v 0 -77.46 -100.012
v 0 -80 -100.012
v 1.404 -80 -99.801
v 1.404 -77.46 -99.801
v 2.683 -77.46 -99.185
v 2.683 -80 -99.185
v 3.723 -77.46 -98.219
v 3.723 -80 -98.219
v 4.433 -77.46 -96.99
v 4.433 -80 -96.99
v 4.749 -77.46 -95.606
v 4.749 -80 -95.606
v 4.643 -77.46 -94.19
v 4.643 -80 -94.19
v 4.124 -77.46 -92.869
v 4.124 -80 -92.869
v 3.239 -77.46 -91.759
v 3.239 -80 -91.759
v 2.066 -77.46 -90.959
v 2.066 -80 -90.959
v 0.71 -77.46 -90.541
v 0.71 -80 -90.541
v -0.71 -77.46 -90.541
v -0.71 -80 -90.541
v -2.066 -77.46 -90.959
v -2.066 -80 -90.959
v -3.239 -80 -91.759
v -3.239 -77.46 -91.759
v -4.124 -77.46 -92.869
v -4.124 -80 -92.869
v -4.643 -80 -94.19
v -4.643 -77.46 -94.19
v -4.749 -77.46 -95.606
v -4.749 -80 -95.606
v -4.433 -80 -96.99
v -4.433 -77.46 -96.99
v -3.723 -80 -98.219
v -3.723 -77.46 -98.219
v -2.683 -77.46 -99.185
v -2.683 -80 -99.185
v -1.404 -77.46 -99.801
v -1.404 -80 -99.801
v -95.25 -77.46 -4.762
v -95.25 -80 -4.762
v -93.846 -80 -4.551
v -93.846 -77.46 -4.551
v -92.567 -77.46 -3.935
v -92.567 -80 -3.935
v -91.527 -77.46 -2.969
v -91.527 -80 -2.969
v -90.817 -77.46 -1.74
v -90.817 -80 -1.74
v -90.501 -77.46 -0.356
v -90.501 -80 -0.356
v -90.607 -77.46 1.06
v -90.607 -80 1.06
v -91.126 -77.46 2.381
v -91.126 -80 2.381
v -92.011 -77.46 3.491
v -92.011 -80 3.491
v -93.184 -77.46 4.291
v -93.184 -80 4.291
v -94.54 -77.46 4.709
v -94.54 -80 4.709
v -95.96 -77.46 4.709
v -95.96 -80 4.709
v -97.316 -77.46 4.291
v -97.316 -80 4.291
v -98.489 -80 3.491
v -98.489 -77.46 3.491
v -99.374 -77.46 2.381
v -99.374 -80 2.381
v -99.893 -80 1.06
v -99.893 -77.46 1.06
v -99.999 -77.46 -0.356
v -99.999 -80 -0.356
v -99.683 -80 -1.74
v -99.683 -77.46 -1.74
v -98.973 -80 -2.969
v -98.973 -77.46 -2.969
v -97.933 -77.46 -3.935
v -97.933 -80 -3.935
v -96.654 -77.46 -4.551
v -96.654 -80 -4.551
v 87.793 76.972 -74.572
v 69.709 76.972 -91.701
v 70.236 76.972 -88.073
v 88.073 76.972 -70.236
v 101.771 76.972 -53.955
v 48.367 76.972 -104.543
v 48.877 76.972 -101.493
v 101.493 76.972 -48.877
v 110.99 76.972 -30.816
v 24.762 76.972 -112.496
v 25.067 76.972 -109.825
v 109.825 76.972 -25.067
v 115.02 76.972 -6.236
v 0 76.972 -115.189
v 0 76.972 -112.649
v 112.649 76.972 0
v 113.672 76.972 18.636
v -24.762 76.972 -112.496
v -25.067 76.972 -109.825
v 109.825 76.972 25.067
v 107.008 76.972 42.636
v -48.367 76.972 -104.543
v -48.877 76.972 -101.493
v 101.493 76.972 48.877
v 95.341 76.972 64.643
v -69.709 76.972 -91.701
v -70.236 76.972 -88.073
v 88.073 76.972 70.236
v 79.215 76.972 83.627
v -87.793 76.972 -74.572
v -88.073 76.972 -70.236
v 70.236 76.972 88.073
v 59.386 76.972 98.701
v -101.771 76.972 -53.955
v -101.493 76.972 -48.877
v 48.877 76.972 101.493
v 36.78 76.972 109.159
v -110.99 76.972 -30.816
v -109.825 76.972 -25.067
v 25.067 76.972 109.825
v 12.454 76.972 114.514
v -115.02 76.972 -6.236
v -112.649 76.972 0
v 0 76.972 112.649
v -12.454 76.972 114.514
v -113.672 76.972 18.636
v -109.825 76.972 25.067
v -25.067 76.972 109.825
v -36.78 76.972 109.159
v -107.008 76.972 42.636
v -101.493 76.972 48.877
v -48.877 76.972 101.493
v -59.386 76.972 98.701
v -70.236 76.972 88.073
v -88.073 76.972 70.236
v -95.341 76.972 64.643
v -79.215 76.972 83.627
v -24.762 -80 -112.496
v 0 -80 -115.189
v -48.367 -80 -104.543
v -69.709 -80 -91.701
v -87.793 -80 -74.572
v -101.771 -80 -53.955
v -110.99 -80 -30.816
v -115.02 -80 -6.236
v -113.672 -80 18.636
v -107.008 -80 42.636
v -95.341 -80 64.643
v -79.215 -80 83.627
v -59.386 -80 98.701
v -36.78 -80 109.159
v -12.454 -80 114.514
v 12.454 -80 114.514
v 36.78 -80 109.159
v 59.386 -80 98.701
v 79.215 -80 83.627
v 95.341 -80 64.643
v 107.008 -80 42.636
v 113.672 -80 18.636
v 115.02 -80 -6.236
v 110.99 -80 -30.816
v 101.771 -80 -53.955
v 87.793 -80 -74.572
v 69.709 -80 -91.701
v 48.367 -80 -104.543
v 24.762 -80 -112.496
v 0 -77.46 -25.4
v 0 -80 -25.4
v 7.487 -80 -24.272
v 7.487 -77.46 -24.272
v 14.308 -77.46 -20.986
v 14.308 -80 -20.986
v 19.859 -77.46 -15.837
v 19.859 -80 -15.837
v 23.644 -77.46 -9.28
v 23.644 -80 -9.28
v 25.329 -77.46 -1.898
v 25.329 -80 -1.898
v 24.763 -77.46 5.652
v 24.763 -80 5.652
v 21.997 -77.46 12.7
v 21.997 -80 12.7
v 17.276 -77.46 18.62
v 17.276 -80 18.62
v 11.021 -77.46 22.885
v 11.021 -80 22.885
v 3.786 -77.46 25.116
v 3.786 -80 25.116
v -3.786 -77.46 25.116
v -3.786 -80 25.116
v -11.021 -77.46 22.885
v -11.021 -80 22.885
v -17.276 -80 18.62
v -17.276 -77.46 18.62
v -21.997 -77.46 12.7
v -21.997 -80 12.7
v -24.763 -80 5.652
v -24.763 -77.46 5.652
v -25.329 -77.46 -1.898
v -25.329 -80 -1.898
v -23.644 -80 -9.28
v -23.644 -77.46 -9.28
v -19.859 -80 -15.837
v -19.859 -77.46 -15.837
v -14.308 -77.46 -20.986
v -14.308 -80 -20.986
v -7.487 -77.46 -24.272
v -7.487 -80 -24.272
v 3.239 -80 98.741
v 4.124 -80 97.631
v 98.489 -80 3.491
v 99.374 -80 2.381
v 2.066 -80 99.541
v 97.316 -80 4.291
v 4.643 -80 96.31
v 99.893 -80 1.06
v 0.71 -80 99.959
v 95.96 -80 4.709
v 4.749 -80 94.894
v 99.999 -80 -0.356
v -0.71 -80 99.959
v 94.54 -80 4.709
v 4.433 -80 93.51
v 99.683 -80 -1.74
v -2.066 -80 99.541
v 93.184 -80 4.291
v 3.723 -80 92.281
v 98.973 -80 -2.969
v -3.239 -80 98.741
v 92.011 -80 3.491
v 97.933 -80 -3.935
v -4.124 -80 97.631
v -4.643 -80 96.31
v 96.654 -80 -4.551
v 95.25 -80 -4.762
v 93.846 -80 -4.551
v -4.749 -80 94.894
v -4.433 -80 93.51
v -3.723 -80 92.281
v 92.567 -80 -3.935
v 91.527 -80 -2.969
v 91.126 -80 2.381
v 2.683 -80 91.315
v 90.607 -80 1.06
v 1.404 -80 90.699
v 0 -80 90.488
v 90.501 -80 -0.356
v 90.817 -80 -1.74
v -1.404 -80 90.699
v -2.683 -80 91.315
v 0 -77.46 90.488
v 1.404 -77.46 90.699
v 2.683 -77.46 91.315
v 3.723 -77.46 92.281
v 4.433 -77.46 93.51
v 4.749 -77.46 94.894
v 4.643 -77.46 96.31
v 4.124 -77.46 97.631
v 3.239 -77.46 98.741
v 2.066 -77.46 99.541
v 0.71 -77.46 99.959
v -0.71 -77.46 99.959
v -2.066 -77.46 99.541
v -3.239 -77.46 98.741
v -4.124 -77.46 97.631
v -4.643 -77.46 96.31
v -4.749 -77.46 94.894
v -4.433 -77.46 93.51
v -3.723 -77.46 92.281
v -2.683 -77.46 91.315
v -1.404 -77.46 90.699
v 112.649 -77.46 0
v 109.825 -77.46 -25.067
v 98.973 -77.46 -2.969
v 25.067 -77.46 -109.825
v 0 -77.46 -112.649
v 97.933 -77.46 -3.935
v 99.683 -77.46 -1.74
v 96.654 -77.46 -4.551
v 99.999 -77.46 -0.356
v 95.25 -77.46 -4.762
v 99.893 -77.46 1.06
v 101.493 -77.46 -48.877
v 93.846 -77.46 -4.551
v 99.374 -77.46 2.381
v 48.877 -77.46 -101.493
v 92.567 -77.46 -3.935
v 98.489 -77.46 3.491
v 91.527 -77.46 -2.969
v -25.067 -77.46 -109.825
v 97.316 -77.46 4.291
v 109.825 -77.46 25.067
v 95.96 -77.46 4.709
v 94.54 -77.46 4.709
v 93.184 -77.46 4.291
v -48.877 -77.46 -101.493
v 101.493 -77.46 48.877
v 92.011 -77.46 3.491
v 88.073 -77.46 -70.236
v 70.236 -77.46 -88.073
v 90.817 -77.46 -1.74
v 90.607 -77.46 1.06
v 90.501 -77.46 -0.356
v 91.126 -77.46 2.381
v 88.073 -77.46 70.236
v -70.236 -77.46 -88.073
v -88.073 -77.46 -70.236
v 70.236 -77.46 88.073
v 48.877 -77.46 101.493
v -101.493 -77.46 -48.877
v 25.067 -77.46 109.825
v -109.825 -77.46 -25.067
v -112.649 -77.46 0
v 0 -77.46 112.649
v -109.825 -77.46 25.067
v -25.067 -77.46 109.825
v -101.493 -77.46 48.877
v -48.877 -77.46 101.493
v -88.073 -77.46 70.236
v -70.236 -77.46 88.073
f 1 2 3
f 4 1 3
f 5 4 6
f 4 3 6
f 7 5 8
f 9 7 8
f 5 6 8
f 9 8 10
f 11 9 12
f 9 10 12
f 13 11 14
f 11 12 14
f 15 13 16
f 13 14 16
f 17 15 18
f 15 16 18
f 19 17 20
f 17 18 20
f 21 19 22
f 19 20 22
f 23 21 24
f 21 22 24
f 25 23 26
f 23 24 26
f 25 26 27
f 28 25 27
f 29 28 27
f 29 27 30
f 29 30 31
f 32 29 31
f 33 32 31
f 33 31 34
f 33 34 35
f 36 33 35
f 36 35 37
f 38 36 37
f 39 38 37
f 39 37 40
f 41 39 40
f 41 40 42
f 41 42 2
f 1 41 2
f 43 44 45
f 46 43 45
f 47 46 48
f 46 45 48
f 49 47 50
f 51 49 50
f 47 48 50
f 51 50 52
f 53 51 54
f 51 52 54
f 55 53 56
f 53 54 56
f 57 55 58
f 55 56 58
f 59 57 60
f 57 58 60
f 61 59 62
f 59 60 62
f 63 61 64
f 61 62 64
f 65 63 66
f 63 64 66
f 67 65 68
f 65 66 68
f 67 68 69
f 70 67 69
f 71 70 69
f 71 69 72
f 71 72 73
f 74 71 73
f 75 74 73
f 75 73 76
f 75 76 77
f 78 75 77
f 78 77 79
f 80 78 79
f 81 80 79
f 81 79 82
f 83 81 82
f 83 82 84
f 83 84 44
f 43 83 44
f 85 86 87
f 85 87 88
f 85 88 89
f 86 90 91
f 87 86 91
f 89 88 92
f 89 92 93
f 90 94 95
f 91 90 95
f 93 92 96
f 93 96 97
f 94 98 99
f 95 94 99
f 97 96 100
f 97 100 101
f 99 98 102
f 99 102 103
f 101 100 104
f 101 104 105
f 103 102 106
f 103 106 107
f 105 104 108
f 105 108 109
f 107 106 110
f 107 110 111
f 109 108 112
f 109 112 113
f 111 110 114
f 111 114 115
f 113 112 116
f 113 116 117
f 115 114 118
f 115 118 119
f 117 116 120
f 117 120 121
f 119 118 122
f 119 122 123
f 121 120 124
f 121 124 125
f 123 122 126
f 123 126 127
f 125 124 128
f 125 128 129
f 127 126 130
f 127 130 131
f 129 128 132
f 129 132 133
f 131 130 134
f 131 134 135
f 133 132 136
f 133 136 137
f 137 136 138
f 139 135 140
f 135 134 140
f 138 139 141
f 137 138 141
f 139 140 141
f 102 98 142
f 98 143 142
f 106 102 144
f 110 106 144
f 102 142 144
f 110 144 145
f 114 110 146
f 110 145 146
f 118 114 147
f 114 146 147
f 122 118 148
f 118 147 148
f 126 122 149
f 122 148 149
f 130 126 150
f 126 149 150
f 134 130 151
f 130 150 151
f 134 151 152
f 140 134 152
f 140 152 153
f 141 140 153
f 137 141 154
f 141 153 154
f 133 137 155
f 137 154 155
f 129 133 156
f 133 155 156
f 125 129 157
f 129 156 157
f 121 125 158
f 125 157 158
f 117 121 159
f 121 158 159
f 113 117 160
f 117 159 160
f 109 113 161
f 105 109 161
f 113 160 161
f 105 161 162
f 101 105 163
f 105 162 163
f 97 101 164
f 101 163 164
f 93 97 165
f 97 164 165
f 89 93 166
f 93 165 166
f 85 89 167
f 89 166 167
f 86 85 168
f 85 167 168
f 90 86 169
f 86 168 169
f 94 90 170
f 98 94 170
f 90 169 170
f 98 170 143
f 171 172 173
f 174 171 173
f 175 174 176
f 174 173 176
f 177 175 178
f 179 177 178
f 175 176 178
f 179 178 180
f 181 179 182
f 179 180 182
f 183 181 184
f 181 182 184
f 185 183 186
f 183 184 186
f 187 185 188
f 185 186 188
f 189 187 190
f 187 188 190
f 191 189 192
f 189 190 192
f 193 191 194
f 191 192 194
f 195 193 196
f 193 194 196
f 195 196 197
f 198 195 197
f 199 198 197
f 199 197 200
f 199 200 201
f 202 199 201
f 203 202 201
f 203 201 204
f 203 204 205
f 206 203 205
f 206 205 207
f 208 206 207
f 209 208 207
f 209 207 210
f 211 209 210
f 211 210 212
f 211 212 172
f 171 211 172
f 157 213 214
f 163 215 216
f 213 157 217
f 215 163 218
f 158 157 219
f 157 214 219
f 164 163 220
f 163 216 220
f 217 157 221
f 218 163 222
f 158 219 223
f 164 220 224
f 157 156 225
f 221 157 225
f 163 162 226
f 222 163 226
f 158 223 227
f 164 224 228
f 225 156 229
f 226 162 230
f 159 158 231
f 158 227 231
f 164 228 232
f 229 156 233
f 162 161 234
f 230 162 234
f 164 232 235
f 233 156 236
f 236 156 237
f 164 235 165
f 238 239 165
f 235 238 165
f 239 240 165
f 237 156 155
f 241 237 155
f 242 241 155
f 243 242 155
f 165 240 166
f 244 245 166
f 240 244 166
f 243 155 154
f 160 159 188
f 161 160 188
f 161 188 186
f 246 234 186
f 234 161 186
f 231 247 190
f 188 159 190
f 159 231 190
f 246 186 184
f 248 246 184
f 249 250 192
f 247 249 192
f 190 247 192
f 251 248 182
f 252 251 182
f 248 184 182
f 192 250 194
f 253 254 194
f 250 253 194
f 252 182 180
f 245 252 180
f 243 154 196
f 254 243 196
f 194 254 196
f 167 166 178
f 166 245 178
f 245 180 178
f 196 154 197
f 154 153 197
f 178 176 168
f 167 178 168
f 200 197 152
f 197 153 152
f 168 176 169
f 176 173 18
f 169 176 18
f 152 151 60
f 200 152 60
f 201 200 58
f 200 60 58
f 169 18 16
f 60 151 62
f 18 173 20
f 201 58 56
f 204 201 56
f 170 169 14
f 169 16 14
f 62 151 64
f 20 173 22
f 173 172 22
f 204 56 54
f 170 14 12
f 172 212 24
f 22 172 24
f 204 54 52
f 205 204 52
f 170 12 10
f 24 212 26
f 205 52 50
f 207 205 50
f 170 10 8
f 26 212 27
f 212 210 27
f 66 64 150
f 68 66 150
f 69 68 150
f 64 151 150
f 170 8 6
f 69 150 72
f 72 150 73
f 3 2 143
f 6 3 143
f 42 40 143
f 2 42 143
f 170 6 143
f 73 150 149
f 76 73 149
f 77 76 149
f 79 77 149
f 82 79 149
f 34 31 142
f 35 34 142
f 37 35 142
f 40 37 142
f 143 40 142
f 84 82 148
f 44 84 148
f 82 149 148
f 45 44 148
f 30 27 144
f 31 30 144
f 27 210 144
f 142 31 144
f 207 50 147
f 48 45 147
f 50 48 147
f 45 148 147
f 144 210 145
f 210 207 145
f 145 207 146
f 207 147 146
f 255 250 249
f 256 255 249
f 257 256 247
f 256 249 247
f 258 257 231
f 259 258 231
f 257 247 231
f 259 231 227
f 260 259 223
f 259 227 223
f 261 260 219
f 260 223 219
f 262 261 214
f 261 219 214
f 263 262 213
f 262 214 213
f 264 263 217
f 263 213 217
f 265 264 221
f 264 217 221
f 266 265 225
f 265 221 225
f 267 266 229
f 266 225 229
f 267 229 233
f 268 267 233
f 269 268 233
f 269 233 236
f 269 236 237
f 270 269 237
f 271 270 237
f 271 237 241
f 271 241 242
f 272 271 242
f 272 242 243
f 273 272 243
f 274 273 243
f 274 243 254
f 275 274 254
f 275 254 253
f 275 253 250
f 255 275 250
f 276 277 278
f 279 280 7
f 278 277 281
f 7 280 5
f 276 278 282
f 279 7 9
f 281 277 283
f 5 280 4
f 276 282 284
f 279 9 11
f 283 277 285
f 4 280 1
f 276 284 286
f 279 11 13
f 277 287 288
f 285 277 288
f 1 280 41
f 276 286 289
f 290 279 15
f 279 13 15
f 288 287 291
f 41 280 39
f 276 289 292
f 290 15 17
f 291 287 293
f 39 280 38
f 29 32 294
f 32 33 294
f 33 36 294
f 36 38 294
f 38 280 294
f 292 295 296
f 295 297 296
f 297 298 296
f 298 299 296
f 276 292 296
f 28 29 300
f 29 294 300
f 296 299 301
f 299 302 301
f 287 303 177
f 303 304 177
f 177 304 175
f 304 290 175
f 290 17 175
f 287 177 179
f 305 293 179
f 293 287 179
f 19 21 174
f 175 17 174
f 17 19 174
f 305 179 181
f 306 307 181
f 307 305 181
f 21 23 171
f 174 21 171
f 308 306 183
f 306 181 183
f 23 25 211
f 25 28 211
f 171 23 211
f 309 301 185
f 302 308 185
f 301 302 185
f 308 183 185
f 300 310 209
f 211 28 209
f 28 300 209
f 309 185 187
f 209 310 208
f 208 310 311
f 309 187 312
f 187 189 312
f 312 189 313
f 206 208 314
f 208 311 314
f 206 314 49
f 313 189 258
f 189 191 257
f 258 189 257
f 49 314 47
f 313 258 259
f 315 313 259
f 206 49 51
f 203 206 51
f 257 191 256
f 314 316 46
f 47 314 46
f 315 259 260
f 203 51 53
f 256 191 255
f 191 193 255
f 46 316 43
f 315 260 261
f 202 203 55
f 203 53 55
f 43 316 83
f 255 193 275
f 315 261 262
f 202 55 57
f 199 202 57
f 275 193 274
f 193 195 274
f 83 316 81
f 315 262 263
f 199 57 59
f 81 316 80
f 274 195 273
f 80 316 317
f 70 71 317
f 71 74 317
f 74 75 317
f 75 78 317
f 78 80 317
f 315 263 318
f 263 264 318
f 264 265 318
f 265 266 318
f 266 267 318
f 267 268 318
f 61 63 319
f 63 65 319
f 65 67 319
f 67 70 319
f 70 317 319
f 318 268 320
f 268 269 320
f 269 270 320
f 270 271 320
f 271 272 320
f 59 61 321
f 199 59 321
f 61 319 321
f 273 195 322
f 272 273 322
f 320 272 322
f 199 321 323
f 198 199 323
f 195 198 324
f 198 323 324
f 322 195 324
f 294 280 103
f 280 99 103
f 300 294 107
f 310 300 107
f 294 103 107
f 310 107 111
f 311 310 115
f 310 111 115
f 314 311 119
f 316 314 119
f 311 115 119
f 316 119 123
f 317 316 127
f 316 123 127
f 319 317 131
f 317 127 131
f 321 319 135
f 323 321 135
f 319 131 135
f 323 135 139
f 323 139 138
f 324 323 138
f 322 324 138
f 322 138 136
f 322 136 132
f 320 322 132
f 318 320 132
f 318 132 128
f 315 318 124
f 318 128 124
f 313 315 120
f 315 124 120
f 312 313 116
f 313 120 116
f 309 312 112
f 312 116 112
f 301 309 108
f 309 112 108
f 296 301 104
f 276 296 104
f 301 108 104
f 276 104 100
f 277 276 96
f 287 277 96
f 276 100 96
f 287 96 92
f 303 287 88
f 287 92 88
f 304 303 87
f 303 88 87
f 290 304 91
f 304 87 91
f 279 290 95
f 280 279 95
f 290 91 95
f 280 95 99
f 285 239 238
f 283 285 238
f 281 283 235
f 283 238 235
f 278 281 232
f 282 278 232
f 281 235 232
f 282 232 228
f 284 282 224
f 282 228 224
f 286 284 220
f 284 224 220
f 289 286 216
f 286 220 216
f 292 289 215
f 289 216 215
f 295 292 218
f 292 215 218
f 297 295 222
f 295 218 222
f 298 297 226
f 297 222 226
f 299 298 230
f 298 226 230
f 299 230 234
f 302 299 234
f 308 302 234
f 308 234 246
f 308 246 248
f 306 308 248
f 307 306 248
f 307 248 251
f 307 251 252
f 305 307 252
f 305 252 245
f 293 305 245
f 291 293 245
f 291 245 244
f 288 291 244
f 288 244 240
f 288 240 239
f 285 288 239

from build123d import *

# Parameters (mm, degrees)
CUT_EXTRUDE2_REACH = 228.224
MOTOR_HOLE_R       = 25.4
MOTOR_HOLE_R_2     = 4.7625


with BuildPart() as part:
    # Compartment → Revolve1 (revolve)
    with BuildSketch(Plane.XY, mode=Mode.PRIVATE) as revolve1_sk:
        Polygon((115.189, -80), (0, -80), (0, -77.46), (112.649, -77.46), (112.649, 76.972), (115.189, 76.972), align=None)
    revolve(revolve1_sk.sketch.rotate(Axis((0, 0, 0), (0, 1, 0)), 90), axis=Axis((0, 0, 0), (0, 1, 0)))

    # Motor Hole → Cut-Extrude2 (cut, up to next)
    with BuildSketch(Plane.XZ.offset(80), mode=Mode.PRIVATE) as cut_extrude2_sk1:
        with Locations(Location((0, 0, 0), (0, 0, 270))):
            Circle(MOTOR_HOLE_R)
    cut_extrude2_tool1 = extrude(cut_extrude2_sk1.sketch, amount=-CUT_EXTRUDE2_REACH, mode=Mode.PRIVATE) & part.part
    # Motor Hole → Cut-Extrude2 (cut, up to next)
    with BuildSketch(Plane.XZ.offset(80), mode=Mode.PRIVATE) as cut_extrude2_sk2:
        with Locations(Location((0, 95.25, 0), (0, 0, 270))):
            Circle(MOTOR_HOLE_R_2)
    cut_extrude2_tool2 = extrude(cut_extrude2_sk2.sketch, amount=-CUT_EXTRUDE2_REACH, mode=Mode.PRIVATE) & part.part
    # Motor Hole → Cut-Extrude2 (cut, up to next)
    with BuildSketch(Plane.XZ.offset(80), mode=Mode.PRIVATE) as cut_extrude2_sk3:
        with Locations(Location((95.25, 0, 0), (0, 0, 270))):
            Circle(MOTOR_HOLE_R_2)
    cut_extrude2_tool3 = extrude(cut_extrude2_sk3.sketch, amount=-CUT_EXTRUDE2_REACH, mode=Mode.PRIVATE) & part.part
    # Motor Hole → Cut-Extrude2 (cut, up to next)
    with BuildSketch(Plane.XZ.offset(80), mode=Mode.PRIVATE) as cut_extrude2_sk4:
        with Locations(Location((0, -95.25, 0), (0, 0, 270))):
            Circle(MOTOR_HOLE_R_2)
    cut_extrude2_tool4 = extrude(cut_extrude2_sk4.sketch, amount=-CUT_EXTRUDE2_REACH, mode=Mode.PRIVATE) & part.part
    # Motor Hole → Cut-Extrude2 (cut, up to next)
    with BuildSketch(Plane.XZ.offset(80), mode=Mode.PRIVATE) as cut_extrude2_sk5:
        with Locations(Location((-95.25, 0, 0), (0, 0, 270))):
            Circle(MOTOR_HOLE_R_2)
    cut_extrude2_tool5 = extrude(cut_extrude2_sk5.sketch, amount=-CUT_EXTRUDE2_REACH, mode=Mode.PRIVATE) & part.part
    add(cut_extrude2_tool1.solids().sort_by_distance((0, -80, 0))[0], mode=Mode.SUBTRACT)
    add(cut_extrude2_tool2.solids().sort_by_distance((0, -80, 95.25))[0], mode=Mode.SUBTRACT)
    add(cut_extrude2_tool3.solids().sort_by_distance((95.25, -80, 0))[0], mode=Mode.SUBTRACT)
    add(cut_extrude2_tool4.solids().sort_by_distance((0, -80, -95.25))[0], mode=Mode.SUBTRACT)
    add(cut_extrude2_tool5.solids().sort_by_distance((-95.25, -80, 0))[0], mode=Mode.SUBTRACT)


solid = part.part
